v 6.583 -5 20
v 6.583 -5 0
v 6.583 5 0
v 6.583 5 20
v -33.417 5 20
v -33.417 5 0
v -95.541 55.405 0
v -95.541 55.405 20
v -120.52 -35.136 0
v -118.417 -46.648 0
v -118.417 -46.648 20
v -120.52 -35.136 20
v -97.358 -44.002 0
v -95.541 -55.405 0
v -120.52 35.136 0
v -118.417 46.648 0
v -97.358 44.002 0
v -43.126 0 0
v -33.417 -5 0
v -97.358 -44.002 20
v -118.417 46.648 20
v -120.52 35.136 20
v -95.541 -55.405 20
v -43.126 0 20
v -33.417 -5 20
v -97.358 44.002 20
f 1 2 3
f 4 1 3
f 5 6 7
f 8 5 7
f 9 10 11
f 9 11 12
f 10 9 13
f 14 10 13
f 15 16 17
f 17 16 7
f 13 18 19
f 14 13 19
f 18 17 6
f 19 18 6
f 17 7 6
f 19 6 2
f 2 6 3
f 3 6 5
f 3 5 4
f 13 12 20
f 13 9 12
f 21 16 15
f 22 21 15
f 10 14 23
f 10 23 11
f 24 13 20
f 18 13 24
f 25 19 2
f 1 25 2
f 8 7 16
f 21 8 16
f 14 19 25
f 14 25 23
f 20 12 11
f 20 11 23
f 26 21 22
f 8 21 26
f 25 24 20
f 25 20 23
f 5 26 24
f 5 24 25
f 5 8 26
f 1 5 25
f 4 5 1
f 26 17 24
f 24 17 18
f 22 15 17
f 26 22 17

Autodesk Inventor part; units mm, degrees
ref_plane "YZ Plane" through (0, 0, 0) normal (1, 0, 0) x (0, 1, 0)
ref_plane "XZ Plane" through (0, 0, 0) normal (0, 1, 0) x (-1, 0, 0)
ref_plane "XY Plane" through (0, 0, 0) normal (0, 0, 1) x (1, 0, 0)
sketch "Esboço1" plane through (0, 0, 0) normal (0, 0, 1) x (1, 0, 0)
  line L0 (-33.417, 5) -> (-95.5408, 55.4046)
  line L1 (-95.5408, 55.4046) -> (-118.417, 46.6482)
  line L2 (-118.417, 46.6482) -> (-120.5199, 35.1357)
  line L3 (-120.5199, 35.1357) -> (-97.358, 44.0015)
  line L4 (-97.358, 44.0015) -> (-22.0526, -17.098)
  line L5 (0, 0) -> (-33.417, 0)
  line L6 (-33.417, 5) -> (6.583, 5)
  line L7 (6.583, 5) -> (6.583, 0)
  line L8 (6.583, 0) -> (-33.417, 0)
  line L9 (-33.417, 0) -> (-33.417, 5)
  line L10 (-33.417, -5) -> (-95.5408, -55.4046)
  line L11 (-95.5408, -55.4046) -> (-118.417, -46.6482)
  line L12 (-118.417, -46.6482) -> (-120.5199, -35.1357)
  line L13 (-120.5199, -35.1357) -> (-97.358, -44.0015)
  line L14 (-97.358, -44.0015) -> (-22.0526, 17.098)
  line L15 (-33.417, -5) -> (6.583, -5)
  line L16 (6.583, -5) -> (6.583, 0)
  line L17 (-33.417, 0) -> (-33.417, -5)
  point P0 (-43.126, 0)
  dimension "d2" = 10
  dimension "d4" = 120
  dimension "d7" = 10
  dimension "d8" = 80
  dimension "d10" = 40
  dimension "d11" = 5
  dimension "d12" = 125
  dimension "d13" = 35.1357
extrude "Extrusão1" add sketch "Esboço1" along normal blind 20
properties part number "pinca"
